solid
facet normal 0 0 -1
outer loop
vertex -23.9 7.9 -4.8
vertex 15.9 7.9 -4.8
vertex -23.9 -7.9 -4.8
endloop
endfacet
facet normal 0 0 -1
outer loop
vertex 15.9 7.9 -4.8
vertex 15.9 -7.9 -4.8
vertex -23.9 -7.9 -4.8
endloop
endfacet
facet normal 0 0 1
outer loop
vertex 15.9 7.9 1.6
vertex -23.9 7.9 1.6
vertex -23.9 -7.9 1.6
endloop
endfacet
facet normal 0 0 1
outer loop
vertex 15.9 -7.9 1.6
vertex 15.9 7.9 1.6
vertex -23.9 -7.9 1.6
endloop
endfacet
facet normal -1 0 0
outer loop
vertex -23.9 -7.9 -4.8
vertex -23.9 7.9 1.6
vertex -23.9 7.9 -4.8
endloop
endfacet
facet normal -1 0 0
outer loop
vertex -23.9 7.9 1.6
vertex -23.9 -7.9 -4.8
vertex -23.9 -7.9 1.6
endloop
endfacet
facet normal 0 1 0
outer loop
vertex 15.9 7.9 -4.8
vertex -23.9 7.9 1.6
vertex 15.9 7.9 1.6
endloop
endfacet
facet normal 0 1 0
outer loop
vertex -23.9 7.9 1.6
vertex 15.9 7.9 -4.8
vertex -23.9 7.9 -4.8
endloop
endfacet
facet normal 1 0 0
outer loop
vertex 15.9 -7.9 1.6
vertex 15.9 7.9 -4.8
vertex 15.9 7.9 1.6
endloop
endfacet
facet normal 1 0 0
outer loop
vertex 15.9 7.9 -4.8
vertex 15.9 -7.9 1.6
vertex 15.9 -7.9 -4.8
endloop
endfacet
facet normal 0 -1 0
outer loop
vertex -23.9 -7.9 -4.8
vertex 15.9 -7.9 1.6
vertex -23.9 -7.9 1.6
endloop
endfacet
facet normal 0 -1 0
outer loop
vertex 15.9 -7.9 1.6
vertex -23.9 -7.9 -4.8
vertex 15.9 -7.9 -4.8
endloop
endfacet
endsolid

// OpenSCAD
function mb_loft_valid_point(p) =
    p[0] != undef;

function mb_loft_p3(p) =
    [p[0], p[1], p[2]];

function mb_loft_level_points(level) =
    [
        for (p = level)
        if (mb_loft_valid_point(p))
        mb_loft_p3(p)
    ];

function mb_loft_next(i, n) =
    (i + 1) % n;

function mb_loft_bottom_faces(n) =
    [for (i = [1 : n - 2]) [0, i + 1, i]]; // reversed: normal z-

function mb_loft_top_faces(n) =
    [for (i = [1 : n - 2]) [n, n + i, n + i + 1]]; // normal z+

function mb_loft_side_faces(n) =
    [
        for (i = [0 : n - 1])
        let(j = (i + 1) % n)
        [i, j, n + j, n + i]
    ];

function mb_loft_faces(n) =
    concat(
        mb_loft_bottom_faces(n),
        mb_loft_top_faces(n),
        mb_loft_side_faces(n)
    );

module mb_loft_polyhedron(levels, convexity = 10) {
    bottom = mb_loft_level_points(levels[0]);
    top    = mb_loft_level_points(levels[1]);
    n      = len(bottom);
    echo(bottom = bottom, top = top);
    assert(len(levels) == 2);
    assert(n == len(top));
    assert(n >= 3);
    assert(n <= 8);

    polyhedron(
        points = concat(bottom, top),
        faces = mb_loft_faces(n),
        convexity = convexity
    );
}

mb_loft_polyhedron(
    [[[-23.9, -7.9, -4.8, [[0, 0], [0, 0], [0, 0]]], undef, [-23.9, 7.9, -4.8, [[0, 0], [0, 0], [0, 0]]], undef, [15.9, 7.9, -4.8, [[0, 0], [0, 0], [0, 0]]], undef, [15.9, -7.9, -4.8, [[0, 0], [0, 0], [0, 0]]], undef], [[-23.9, -7.9, 1.6, [[0, 0], [0, 0], [0, 0]]], undef, [-23.9, 7.9, 1.6, [[0, 0], [0, 0], [0, 0]]], undef, [15.9, 7.9, 1.6, [[0, 0], [0, 0], [0, 0]]], undef, [15.9, -7.9, 1.6, [[0, 0], [0, 0], [0, 0]]], undef]]
    , debug = false);
